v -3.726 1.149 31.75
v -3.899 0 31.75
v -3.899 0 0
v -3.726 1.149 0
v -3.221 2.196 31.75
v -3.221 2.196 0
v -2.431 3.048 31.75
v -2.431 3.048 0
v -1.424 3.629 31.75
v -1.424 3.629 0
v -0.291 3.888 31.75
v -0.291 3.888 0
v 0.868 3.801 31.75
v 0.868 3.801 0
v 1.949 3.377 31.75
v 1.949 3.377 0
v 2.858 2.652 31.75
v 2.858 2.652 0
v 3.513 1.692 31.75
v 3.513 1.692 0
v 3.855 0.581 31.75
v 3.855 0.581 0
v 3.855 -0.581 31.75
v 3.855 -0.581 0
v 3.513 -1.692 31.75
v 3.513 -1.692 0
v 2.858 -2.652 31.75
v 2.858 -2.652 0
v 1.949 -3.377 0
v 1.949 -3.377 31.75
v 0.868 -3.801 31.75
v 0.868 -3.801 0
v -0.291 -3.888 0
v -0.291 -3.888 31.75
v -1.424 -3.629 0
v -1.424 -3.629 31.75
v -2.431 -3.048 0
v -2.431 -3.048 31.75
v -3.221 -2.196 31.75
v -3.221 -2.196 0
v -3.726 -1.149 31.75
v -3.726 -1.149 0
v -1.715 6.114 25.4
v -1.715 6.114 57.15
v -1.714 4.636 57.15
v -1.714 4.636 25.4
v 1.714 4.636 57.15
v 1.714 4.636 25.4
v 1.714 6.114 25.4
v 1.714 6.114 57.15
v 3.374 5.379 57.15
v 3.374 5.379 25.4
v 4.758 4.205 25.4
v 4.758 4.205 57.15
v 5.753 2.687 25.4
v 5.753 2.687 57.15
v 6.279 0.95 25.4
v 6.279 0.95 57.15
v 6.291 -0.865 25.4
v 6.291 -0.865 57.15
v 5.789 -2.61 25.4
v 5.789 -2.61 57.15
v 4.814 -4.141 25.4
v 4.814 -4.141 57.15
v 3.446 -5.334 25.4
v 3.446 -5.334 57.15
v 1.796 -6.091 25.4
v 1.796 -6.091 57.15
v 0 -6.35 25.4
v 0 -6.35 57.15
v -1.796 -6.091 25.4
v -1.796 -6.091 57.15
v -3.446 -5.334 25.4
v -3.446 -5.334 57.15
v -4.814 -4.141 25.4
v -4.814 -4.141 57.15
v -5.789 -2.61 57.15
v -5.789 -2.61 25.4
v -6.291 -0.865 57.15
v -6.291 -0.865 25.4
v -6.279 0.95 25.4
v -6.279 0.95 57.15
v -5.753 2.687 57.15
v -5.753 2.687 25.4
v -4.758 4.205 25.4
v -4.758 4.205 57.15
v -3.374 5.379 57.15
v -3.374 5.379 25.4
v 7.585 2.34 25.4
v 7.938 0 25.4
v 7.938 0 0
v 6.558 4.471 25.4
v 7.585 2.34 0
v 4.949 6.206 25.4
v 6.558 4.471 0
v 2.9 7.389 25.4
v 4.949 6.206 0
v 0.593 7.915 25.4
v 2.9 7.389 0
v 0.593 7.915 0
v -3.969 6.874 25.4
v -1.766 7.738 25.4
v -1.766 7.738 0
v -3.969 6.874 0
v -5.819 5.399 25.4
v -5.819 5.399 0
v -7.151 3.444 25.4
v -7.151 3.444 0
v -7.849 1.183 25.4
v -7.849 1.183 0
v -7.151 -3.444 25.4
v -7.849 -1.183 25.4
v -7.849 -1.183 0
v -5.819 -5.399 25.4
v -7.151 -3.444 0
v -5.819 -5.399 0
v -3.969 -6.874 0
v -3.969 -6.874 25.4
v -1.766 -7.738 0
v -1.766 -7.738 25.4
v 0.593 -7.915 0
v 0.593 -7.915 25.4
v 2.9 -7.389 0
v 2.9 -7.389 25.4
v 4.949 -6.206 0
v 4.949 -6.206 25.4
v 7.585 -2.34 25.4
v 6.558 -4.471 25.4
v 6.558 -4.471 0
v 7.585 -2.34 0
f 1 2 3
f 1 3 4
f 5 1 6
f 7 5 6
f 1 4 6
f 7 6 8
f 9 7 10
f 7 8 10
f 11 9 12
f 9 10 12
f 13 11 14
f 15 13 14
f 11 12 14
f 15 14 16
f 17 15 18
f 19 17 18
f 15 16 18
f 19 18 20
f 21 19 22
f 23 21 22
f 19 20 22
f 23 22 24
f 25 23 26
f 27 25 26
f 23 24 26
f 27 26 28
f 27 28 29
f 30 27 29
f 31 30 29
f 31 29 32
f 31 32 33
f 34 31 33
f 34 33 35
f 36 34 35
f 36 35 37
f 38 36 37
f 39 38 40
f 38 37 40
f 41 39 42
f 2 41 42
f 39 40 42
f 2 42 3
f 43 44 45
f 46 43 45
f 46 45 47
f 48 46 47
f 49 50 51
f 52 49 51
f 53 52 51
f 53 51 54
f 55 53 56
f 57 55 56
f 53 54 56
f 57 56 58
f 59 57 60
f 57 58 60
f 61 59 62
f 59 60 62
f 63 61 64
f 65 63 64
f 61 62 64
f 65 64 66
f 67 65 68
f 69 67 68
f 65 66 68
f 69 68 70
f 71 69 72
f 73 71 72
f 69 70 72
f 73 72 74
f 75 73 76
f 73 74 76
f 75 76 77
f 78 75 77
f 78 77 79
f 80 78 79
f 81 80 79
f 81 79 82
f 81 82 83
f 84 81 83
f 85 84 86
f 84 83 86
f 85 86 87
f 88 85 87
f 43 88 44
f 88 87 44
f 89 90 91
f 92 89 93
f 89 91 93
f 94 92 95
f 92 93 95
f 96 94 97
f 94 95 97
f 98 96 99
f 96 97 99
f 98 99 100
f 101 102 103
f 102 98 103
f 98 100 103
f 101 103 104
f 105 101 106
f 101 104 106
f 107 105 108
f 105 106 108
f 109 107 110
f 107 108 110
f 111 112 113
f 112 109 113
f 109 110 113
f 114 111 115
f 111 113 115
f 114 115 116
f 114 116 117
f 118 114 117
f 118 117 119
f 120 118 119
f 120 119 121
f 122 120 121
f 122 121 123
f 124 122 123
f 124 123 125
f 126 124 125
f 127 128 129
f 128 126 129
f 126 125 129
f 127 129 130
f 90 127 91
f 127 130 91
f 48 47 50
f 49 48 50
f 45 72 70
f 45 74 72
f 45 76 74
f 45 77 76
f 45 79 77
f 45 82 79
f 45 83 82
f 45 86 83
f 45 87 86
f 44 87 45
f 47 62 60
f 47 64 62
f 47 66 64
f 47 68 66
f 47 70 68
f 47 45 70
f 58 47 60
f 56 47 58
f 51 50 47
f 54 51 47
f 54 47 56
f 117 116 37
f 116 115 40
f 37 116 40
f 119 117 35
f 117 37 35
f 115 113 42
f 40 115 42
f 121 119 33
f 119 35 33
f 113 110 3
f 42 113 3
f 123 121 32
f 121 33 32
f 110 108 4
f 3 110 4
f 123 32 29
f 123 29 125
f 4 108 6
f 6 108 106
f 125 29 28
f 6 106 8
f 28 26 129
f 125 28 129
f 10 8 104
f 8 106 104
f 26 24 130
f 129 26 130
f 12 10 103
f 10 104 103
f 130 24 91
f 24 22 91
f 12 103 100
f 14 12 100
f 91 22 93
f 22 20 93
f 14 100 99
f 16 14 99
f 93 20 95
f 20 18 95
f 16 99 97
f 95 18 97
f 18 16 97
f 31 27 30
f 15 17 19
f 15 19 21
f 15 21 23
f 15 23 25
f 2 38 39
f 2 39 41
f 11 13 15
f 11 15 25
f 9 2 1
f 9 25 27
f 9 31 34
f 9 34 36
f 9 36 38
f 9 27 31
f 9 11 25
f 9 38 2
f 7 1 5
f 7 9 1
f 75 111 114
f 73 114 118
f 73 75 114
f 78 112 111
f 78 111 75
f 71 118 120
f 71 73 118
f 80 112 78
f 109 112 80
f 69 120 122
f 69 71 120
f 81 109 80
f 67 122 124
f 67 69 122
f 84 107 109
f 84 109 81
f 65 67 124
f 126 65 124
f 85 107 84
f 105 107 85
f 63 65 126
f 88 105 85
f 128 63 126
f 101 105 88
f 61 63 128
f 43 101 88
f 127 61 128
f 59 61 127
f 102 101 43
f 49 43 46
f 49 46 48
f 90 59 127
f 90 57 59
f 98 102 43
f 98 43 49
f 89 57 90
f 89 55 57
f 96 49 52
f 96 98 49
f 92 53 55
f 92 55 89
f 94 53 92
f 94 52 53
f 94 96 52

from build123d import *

# Parameters (mm, degrees)
SKETCH1_R           = 7.9375
BOSS_EXTRUDE1_DEPTH = 57.15
SKETCH2_R           = 3.8989
CUT_EXTRUDE1_DEPTH  = 31.75
SKETCH3_R           = 8.001
CUT_EXTRUDE2_DEPTH  = 31.75


with BuildPart() as part:
    # Sketch1 → Boss-Extrude1 (new body)
    with BuildSketch(Plane.XY):
        Circle(SKETCH1_R)
    extrude(amount=BOSS_EXTRUDE1_DEPTH)

    # Sketch2 → Cut-Extrude1 (cut)
    with BuildSketch(Plane(origin=(0, 0, 0), x_dir=(-1, 0, 0), z_dir=(0, 0, -1))):
        Circle(SKETCH2_R)
    extrude(amount=-CUT_EXTRUDE1_DEPTH, mode=Mode.SUBTRACT)

    # Sketch3 → Cut-Extrude2 (cut)
    with BuildSketch(Plane.XY.offset(57.15)):
        Circle(SKETCH3_R)
        with BuildLine():
            Line((-1.7145, 4.6355), (1.7145, 4.6355))
            Line((1.7145, 4.6355), (1.7145, 6.114163046))
            ThreePointArc((1.7145, 6.114163046), (0, -6.35), (-1.7145, 6.114163046))
            Line((-1.7145, 6.114163046), (-1.7145, 4.6355))
        make_face(mode=Mode.SUBTRACT)
    extrude(amount=-CUT_EXTRUDE2_DEPTH, mode=Mode.SUBTRACT)


solid = part.part
